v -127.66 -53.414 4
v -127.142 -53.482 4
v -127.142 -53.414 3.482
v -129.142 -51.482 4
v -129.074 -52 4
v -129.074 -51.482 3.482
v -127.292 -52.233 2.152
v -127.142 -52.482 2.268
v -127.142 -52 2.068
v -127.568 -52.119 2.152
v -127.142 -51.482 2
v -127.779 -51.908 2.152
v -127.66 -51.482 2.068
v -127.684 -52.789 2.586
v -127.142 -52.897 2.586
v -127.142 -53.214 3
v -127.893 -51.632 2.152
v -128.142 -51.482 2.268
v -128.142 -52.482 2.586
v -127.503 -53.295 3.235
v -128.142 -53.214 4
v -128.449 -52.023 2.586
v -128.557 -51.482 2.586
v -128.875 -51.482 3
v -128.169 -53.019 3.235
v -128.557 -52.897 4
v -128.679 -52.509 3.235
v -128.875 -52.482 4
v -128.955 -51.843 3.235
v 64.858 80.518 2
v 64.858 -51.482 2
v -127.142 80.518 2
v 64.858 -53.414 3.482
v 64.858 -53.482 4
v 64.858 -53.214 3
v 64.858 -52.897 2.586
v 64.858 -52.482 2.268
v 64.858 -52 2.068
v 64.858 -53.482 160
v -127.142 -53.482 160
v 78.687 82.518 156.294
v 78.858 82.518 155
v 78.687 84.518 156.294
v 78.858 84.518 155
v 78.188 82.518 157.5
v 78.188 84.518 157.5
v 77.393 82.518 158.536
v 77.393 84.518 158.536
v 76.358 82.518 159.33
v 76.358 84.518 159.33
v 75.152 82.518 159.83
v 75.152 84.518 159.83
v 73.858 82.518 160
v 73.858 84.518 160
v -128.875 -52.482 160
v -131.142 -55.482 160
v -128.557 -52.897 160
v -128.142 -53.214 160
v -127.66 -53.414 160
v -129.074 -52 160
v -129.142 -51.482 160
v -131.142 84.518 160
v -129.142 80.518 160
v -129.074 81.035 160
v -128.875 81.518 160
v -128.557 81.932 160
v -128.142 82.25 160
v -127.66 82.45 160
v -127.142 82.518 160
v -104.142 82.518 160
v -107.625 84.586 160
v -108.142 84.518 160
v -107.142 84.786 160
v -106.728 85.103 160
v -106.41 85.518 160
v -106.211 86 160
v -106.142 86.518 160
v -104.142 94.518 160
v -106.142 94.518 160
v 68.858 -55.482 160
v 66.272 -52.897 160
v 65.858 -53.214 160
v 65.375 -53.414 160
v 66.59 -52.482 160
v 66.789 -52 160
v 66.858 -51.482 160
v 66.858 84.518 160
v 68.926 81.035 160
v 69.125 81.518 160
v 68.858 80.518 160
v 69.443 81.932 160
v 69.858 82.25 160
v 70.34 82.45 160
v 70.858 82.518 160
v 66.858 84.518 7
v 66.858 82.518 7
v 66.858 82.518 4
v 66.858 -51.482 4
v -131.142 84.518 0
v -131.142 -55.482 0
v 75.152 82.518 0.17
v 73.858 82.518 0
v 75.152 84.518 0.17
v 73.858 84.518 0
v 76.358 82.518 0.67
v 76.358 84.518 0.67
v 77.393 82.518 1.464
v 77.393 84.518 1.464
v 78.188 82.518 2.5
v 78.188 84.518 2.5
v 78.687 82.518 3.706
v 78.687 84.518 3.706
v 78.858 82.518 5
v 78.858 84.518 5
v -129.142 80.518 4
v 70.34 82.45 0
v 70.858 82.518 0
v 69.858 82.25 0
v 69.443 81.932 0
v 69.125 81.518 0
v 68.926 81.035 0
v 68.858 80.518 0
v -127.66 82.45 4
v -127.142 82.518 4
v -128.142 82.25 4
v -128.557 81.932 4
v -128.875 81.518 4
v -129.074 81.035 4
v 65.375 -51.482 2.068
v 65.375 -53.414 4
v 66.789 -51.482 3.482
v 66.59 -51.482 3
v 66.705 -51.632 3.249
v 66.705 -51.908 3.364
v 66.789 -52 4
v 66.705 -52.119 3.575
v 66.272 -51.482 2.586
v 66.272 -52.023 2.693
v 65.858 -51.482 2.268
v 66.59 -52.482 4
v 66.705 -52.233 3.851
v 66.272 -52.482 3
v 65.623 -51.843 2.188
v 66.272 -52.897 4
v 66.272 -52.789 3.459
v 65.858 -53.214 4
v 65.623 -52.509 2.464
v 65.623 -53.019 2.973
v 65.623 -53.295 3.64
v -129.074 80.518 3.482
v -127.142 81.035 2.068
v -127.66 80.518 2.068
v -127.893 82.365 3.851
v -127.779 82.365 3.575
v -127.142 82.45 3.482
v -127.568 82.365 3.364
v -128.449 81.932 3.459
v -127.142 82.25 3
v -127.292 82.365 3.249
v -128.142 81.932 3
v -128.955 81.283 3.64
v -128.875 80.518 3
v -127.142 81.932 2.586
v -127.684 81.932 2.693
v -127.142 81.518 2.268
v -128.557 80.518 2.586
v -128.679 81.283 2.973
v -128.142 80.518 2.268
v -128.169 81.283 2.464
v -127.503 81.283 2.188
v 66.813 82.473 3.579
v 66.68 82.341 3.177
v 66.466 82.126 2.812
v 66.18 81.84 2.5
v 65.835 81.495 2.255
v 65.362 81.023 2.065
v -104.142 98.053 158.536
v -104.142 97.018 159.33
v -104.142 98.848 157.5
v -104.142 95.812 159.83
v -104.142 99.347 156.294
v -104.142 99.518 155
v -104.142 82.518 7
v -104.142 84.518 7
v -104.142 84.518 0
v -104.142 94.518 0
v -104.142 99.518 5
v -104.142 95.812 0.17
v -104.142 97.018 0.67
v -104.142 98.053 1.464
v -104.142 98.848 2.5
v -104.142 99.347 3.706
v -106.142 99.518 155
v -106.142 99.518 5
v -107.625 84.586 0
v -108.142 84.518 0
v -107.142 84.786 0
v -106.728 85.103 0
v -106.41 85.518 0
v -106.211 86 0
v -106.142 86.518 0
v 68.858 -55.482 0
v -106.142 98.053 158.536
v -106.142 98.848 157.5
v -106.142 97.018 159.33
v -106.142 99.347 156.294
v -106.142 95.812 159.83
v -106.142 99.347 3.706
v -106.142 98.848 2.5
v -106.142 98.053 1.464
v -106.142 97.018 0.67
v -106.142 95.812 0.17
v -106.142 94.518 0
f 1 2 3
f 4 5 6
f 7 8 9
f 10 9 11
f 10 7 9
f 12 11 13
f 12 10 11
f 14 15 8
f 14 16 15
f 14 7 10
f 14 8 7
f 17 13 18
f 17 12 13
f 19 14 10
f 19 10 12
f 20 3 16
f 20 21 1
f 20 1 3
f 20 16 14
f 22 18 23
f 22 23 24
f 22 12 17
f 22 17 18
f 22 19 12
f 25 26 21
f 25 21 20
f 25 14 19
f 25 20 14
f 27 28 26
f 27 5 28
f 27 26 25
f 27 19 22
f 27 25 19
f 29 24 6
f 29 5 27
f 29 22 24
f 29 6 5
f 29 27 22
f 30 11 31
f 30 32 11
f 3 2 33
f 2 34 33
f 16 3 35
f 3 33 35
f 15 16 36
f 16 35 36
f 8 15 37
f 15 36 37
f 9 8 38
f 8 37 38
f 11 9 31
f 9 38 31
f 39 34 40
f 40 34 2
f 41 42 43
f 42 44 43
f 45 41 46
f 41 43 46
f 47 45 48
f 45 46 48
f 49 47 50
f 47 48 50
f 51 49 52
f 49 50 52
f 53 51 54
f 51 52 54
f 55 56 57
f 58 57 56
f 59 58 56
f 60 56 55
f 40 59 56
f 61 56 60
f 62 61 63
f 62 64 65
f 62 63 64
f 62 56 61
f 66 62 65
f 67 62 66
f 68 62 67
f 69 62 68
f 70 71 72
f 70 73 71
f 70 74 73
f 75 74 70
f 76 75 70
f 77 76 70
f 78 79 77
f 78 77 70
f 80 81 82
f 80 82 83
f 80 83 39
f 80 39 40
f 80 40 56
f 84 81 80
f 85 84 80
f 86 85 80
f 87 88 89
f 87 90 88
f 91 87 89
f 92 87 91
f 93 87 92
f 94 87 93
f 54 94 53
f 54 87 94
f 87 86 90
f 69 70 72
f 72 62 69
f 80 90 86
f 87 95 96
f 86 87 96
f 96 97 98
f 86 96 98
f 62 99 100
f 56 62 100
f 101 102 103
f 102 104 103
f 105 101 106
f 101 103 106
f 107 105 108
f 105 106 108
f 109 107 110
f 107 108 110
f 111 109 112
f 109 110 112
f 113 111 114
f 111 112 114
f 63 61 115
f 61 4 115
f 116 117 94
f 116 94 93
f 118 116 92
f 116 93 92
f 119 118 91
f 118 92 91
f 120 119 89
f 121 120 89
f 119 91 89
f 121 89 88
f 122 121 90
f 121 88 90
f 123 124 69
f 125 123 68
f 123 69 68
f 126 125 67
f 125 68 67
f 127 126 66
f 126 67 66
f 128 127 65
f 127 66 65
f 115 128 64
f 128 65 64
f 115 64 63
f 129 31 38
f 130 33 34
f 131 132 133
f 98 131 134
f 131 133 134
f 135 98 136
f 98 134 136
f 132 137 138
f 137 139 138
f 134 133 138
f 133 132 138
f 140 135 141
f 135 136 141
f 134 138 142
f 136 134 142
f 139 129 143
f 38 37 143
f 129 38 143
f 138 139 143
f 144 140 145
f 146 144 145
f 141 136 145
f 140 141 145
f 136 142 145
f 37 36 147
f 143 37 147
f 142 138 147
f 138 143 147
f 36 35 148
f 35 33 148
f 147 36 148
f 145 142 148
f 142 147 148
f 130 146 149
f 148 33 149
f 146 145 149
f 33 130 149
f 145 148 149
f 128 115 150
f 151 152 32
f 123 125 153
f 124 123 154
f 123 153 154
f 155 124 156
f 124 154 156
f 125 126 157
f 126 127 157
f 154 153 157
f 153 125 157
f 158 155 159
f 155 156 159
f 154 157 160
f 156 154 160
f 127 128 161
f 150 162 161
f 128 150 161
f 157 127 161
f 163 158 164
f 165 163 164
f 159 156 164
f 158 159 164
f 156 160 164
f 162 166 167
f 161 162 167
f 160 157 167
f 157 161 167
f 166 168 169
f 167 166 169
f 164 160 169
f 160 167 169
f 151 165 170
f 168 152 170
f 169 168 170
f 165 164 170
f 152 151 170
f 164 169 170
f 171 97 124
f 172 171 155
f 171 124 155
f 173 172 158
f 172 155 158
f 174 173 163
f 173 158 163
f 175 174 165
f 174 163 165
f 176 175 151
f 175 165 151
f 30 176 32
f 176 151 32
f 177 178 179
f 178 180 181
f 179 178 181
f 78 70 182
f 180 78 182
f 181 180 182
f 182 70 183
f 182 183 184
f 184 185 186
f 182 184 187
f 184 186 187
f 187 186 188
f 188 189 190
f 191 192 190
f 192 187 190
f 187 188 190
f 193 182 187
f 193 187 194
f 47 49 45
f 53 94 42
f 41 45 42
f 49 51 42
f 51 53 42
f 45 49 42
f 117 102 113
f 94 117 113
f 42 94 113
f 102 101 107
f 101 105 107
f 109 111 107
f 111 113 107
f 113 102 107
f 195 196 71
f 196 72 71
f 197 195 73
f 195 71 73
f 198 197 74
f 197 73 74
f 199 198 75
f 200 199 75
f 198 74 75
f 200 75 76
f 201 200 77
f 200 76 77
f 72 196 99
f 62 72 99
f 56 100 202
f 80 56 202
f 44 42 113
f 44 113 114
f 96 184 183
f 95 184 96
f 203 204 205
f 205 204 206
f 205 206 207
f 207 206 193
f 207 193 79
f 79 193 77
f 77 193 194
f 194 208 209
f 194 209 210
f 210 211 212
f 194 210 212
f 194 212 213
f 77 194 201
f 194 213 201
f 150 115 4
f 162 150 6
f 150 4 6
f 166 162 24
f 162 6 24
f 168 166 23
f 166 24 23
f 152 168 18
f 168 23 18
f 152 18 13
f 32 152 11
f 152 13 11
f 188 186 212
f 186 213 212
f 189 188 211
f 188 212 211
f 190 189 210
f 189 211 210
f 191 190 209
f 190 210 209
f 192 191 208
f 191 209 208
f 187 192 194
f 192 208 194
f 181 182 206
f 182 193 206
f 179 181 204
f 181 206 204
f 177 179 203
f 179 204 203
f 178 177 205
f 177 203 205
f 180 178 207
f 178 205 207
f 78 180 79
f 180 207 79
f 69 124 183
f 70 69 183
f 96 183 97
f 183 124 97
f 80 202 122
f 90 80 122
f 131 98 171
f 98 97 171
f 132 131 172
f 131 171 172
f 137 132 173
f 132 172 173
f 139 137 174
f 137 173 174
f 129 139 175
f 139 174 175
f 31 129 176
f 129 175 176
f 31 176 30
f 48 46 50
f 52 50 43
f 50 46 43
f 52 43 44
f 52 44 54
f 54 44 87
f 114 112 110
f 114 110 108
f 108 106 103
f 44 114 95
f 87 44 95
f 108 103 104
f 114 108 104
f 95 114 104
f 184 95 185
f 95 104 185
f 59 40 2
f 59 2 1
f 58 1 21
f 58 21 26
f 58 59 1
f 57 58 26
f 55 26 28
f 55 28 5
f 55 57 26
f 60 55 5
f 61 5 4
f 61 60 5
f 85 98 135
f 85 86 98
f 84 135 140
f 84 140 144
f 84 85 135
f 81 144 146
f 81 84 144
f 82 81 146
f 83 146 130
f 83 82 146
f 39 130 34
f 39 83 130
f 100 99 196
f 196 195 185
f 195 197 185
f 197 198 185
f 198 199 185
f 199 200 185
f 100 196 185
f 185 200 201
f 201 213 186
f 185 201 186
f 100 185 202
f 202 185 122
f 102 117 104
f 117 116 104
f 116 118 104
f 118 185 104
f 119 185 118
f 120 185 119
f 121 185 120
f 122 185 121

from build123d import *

# Parameters (mm, degrees)
F0_W     = 10
F0_H     = 2
F1_DEPTH = 160
F0_W_2   = 171
F2_DEPTH = 7
F3_DEPTH = 2
F4_R     = 5
F5_R     = 2


with BuildPart() as f1:
    # F0 (on Top) → F1 (new body)
    with BuildSketch(Plane.XY):
        Polygon((-106.142494, 84.517702), (-131.142494, 84.517702), (-131.142494, -55.482298), (68.857506, -55.482298), (68.857506, 82.517702), (68.857506, 84.517702), (66.857506, 84.517702), (66.857506, 82.517702), (66.857506, -53.482298), (-129.142494, -53.482298), (-129.142494, 82.517702), (-104.142494, 82.517702), (-104.142494, 84.517702), (-104.142494, 99.517702), (-106.142494, 99.517702), align=None)
        with Locations((73.857506, 83.517702)):
            Rectangle(F0_W, F0_H)
    extrude(amount=F1_DEPTH)

    # F0 (on Top) → F2 (join)
    with BuildSketch(Plane.XY):
        with Locations((-18.642494, 83.517702)):
            Rectangle(F0_W_2, F0_H)
    extrude(amount=F2_DEPTH)

    # F0 (on Top) → F3 (join)
    with BuildSketch(Plane.XY):
        Polygon((66.857506, 82.517702), (-104.142494, 82.517702), (-129.142494, 82.517702), (-129.142494, -53.482298), (66.857506, -53.482298), align=None)
    extrude(amount=F3_DEPTH)

    # F4
    f4_edges = [f1.edges().sort_by_distance(p)[0] for p in [
        (-105.142494, 99.517702, 160),
        (-105.142494, 99.517702, 0),
        (78.857506, 83.517702, 0),
        (78.857506, 83.517702, 160),
    ]]
    fillet(f4_edges, radius=F4_R)

    # F5
    f5_edges = [f1.edges().sort_by_distance(p)[0] for p in [
        (-129.142494, -53.482298, 81),
        (-31.142494, -53.482298, 2),
        (-129.142494, 14.517702, 2),
        (66.857506, 14.517702, 2),
        (66.857506, -53.482298, 81),
        (-129.142494, 82.517702, 81),
        (-31.142494, 82.517702, 2),
        (68.857506, 82.517702, 80),
        (-106.142494, 84.517702, 80),
    ]]
    fillet(f5_edges, radius=F5_R)


solid = f1.part
